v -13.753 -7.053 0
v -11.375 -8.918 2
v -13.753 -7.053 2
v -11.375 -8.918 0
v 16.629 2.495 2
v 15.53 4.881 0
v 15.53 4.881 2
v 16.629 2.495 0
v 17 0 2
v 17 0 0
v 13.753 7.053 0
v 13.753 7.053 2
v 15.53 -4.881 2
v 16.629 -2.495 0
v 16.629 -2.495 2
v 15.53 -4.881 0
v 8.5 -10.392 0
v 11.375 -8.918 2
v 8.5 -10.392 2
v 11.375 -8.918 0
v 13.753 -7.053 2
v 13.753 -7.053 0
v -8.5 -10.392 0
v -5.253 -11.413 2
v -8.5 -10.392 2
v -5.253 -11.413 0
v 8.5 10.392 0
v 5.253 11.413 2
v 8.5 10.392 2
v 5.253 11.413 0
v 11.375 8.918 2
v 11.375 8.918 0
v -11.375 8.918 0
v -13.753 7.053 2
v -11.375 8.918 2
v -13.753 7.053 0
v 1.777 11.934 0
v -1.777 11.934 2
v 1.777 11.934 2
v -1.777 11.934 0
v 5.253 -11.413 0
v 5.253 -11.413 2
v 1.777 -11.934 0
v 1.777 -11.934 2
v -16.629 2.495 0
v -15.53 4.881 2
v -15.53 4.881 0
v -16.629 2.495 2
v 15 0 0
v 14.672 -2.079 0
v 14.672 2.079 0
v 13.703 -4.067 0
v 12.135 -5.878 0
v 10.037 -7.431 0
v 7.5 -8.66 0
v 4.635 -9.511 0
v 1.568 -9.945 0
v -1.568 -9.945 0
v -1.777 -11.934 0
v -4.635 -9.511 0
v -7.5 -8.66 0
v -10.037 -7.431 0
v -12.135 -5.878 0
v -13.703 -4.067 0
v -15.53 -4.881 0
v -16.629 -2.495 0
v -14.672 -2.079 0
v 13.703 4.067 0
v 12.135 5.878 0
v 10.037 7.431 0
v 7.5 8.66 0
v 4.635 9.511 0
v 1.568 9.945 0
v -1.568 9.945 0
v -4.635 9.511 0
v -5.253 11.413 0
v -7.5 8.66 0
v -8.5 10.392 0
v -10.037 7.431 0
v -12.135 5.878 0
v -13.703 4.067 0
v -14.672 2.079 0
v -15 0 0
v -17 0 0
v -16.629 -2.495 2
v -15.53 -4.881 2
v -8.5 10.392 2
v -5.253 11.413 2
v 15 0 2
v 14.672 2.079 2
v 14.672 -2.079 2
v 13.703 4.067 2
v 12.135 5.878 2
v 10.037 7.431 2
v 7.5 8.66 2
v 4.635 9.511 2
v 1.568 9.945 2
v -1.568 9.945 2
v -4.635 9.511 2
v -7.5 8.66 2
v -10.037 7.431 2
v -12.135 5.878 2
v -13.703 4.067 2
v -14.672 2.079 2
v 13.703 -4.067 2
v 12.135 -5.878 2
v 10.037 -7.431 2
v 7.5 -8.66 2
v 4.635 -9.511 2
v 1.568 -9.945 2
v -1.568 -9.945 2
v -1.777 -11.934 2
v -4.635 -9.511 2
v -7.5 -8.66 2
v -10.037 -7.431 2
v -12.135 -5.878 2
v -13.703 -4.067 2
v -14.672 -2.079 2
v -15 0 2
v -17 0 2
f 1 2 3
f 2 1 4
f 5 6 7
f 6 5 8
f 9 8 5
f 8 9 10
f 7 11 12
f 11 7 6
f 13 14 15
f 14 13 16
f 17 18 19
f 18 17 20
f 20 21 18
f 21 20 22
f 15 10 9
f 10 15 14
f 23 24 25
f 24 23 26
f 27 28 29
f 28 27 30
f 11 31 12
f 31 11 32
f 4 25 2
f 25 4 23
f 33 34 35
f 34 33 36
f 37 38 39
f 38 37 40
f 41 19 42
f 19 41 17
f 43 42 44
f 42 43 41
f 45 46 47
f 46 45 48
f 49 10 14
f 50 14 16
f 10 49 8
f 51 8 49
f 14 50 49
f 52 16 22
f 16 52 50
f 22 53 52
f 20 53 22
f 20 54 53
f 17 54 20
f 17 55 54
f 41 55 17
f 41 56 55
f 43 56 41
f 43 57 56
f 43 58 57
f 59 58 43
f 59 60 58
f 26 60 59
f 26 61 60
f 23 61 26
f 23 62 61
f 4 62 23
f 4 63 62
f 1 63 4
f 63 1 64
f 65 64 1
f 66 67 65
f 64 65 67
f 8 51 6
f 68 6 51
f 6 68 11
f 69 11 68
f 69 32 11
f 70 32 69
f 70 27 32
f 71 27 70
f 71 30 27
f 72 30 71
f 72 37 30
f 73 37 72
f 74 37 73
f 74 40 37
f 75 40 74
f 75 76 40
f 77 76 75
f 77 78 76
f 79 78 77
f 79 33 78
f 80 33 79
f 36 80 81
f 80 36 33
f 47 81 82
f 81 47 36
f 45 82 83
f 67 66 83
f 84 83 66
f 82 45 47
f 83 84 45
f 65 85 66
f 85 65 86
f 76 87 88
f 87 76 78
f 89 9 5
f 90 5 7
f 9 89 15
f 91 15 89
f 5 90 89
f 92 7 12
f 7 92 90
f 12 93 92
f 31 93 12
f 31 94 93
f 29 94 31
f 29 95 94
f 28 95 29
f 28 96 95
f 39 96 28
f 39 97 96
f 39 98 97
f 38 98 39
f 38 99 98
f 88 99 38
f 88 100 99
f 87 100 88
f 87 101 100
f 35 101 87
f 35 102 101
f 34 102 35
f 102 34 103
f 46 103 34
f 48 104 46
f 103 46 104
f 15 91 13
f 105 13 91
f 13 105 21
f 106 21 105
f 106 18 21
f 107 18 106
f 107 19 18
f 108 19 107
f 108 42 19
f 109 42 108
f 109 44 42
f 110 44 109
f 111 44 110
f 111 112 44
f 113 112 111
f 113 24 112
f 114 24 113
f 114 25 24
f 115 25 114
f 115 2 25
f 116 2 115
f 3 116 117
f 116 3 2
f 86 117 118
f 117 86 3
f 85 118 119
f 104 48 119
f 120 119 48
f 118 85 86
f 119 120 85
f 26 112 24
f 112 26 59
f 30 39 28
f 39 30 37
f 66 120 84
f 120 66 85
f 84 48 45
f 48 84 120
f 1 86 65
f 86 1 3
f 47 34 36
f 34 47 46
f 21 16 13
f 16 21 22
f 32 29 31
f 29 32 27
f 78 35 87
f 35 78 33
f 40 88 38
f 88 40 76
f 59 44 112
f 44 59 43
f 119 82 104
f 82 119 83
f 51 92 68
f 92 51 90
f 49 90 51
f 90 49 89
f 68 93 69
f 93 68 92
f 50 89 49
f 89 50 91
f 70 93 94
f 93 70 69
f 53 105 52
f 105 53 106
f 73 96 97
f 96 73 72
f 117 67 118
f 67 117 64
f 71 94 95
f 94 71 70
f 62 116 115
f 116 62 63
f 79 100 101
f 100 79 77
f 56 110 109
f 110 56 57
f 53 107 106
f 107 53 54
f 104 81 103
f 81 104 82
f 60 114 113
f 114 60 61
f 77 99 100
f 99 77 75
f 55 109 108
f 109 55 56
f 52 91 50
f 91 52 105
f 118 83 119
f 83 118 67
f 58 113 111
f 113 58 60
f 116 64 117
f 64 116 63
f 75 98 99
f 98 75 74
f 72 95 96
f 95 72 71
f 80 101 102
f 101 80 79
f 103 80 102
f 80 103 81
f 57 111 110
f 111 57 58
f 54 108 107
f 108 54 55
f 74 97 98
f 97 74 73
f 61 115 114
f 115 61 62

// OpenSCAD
use <MCAD/regular_shapes.scad>

tap_x = 30/2;
tap_y = 20/2;

t = 2;

oval_tube(t, tap_x + t, tap_y + t, t);
